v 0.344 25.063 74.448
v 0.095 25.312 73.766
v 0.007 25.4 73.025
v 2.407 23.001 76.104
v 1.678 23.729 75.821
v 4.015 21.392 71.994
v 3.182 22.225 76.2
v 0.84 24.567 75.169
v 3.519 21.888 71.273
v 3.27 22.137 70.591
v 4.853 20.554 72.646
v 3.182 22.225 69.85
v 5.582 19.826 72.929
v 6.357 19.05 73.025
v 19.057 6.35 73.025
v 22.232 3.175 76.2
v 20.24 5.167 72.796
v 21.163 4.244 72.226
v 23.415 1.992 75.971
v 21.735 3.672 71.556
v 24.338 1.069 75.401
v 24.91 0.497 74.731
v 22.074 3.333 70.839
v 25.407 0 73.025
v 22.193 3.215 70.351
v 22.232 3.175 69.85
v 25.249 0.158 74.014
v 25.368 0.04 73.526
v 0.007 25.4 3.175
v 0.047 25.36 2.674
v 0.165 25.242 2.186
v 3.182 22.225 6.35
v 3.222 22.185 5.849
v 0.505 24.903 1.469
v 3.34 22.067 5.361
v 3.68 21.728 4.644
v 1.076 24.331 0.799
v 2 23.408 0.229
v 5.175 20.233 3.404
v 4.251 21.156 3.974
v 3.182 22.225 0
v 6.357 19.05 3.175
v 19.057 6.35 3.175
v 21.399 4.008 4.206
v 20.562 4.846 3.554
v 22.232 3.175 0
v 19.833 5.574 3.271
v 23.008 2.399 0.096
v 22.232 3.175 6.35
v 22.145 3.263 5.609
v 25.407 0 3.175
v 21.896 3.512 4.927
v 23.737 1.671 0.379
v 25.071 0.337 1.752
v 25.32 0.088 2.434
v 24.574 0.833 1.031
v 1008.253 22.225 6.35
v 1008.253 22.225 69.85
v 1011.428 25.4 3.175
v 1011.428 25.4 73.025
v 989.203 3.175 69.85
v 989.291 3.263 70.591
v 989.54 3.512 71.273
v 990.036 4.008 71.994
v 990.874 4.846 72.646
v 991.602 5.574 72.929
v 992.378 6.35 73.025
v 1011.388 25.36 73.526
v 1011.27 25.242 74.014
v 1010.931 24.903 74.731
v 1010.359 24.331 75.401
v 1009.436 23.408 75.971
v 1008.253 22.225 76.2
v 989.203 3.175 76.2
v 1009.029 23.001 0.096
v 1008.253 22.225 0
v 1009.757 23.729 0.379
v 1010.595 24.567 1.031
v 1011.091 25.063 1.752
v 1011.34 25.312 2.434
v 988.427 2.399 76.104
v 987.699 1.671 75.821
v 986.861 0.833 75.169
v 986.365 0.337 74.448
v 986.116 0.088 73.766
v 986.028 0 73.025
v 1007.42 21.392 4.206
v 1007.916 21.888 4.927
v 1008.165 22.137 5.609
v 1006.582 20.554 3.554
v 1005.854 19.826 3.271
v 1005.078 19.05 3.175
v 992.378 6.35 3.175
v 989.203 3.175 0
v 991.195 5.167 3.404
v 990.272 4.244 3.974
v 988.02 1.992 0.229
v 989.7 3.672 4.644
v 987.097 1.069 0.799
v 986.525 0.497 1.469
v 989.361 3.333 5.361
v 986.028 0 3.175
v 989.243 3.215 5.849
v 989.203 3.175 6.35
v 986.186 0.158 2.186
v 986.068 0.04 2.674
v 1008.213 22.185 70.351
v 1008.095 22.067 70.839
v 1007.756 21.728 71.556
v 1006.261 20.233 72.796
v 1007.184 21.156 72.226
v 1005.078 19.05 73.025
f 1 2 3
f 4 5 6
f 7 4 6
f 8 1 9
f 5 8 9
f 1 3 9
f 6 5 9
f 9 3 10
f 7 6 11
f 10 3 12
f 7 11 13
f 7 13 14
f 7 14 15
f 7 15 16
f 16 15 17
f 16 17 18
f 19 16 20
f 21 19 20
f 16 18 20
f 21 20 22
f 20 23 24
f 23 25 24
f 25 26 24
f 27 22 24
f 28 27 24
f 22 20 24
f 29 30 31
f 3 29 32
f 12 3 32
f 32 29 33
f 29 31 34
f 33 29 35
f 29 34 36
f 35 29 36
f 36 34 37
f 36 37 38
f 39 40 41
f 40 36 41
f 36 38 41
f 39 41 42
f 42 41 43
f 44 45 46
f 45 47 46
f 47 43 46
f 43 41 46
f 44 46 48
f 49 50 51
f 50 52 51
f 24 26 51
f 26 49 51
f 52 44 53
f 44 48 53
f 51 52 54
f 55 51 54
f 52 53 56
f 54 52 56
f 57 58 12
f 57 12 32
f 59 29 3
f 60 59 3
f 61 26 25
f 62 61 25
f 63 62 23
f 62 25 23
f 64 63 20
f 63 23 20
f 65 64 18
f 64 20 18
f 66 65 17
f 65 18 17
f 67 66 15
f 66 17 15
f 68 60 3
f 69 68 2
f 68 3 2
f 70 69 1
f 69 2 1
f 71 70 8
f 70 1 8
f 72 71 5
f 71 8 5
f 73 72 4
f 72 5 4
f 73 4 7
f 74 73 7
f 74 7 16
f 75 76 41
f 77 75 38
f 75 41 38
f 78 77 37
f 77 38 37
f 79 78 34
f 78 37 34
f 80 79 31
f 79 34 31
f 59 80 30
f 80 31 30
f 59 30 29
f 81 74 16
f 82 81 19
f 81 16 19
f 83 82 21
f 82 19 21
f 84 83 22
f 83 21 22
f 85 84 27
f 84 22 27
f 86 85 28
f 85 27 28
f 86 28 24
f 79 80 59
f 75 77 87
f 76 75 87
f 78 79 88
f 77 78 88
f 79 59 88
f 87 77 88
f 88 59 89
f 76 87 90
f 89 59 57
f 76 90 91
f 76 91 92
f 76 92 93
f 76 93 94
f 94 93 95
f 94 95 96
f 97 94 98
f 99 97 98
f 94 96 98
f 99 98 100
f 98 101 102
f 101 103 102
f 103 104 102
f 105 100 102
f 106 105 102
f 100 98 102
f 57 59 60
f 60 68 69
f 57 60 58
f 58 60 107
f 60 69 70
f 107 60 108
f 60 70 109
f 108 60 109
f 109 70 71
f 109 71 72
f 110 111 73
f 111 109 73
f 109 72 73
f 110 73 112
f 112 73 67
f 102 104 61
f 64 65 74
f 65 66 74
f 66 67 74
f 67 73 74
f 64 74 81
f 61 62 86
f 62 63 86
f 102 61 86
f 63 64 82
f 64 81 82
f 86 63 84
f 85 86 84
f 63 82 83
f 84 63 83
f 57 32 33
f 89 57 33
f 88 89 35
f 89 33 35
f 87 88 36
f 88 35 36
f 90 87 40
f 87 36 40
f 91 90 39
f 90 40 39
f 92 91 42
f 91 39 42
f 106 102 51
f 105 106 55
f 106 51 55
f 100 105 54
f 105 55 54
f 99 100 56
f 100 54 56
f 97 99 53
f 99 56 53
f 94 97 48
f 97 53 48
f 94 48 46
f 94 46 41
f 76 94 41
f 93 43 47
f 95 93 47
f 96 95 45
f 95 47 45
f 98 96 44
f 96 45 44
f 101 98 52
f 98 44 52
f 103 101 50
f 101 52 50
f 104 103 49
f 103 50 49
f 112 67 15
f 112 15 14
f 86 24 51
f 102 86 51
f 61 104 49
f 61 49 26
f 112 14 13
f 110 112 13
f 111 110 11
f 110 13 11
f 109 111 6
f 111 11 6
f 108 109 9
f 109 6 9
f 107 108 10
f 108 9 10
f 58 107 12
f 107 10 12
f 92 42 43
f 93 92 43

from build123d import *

# Parameters (mm, degrees)
F1_DEPTH = 1011.428
F3_DEPTH = 76.201
F5_DEPTH = 76.201


with BuildPart() as f1:
    # F0 (on Right) → F1 (new body)
    with BuildSketch(Plane.YZ):
        with BuildLine():
            ThreePointArc((0, 3.175), (0.9299359697, 0.9299359697), (3.175, 0))
            Line((3.175, 0), (22.225, 0))
            ThreePointArc((22.225, 0), (24.4700640303, 0.9299359697), (25.4, 3.175))
            Line((25.4, 3.175), (25.4, 73.025))
            ThreePointArc((25.4, 73.025), (24.4700640303, 75.2700640303), (22.225, 76.2))
            Line((22.225, 76.2), (3.175, 76.2))
            ThreePointArc((3.175, 76.2), (0.9299359697, 75.2700640303), (0, 73.025))
            Line((0, 73.025), (0, 3.175))
        make_face()
        with BuildLine():
            Line((19.05, 3.175), (6.35, 3.175))
            ThreePointArc((6.35, 3.175), (4.1049359697, 4.1049359697), (3.175, 6.35))
            Line((3.175, 6.35), (3.175, 69.85))
            ThreePointArc((3.175, 69.85), (4.1049359697, 72.0950640303), (6.35, 73.025))
            Line((6.35, 73.025), (19.05, 73.025))
            ThreePointArc((19.05, 73.025), (21.2950640303, 72.0950640303), (22.225, 69.85))
            Line((22.225, 69.85), (22.225, 6.35))
            ThreePointArc((22.225, 6.35), (21.2950640303, 4.1049359697), (19.05, 3.175))
        make_face(mode=Mode.SUBTRACT)
    extrude(amount=F1_DEPTH)

    # F2 (on face) → F3 (cut, through all)
    with BuildSketch(Plane(origin=(0, 0, 0), x_dir=(1, 0, 0), z_dir=(0, 0, -1))):
        Polygon((22.23230685, -3.175), (0, -3.175), (0, -22.225), (3.18230685, -22.225), align=None)
        Polygon((3.18230685, -22.225), (0, -22.225), (0, -25.40730685), align=None)
        Polygon((25.40730685, 0), (0, 0), (0, -3.175), (22.23230685, -3.175), align=None)
    extrude(amount=-F3_DEPTH, mode=Mode.SUBTRACT)

    # F4 (on face) → F5 (cut, through all)
    with BuildSketch(Plane.XY.offset(76.2)):
        Polygon((1011.428, 22.225), (1011.428, 25.4), (1008.253, 22.225), align=None)
        Polygon((1011.428, 0), (1011.428, 3.175), (989.203, 3.175), (986.028, 0), align=None)
        Polygon((1011.428, 3.175), (1011.428, 22.225), (1008.253, 22.225), (989.203, 3.175), align=None)
    extrude(amount=-F5_DEPTH, mode=Mode.SUBTRACT)


solid = f1.part
